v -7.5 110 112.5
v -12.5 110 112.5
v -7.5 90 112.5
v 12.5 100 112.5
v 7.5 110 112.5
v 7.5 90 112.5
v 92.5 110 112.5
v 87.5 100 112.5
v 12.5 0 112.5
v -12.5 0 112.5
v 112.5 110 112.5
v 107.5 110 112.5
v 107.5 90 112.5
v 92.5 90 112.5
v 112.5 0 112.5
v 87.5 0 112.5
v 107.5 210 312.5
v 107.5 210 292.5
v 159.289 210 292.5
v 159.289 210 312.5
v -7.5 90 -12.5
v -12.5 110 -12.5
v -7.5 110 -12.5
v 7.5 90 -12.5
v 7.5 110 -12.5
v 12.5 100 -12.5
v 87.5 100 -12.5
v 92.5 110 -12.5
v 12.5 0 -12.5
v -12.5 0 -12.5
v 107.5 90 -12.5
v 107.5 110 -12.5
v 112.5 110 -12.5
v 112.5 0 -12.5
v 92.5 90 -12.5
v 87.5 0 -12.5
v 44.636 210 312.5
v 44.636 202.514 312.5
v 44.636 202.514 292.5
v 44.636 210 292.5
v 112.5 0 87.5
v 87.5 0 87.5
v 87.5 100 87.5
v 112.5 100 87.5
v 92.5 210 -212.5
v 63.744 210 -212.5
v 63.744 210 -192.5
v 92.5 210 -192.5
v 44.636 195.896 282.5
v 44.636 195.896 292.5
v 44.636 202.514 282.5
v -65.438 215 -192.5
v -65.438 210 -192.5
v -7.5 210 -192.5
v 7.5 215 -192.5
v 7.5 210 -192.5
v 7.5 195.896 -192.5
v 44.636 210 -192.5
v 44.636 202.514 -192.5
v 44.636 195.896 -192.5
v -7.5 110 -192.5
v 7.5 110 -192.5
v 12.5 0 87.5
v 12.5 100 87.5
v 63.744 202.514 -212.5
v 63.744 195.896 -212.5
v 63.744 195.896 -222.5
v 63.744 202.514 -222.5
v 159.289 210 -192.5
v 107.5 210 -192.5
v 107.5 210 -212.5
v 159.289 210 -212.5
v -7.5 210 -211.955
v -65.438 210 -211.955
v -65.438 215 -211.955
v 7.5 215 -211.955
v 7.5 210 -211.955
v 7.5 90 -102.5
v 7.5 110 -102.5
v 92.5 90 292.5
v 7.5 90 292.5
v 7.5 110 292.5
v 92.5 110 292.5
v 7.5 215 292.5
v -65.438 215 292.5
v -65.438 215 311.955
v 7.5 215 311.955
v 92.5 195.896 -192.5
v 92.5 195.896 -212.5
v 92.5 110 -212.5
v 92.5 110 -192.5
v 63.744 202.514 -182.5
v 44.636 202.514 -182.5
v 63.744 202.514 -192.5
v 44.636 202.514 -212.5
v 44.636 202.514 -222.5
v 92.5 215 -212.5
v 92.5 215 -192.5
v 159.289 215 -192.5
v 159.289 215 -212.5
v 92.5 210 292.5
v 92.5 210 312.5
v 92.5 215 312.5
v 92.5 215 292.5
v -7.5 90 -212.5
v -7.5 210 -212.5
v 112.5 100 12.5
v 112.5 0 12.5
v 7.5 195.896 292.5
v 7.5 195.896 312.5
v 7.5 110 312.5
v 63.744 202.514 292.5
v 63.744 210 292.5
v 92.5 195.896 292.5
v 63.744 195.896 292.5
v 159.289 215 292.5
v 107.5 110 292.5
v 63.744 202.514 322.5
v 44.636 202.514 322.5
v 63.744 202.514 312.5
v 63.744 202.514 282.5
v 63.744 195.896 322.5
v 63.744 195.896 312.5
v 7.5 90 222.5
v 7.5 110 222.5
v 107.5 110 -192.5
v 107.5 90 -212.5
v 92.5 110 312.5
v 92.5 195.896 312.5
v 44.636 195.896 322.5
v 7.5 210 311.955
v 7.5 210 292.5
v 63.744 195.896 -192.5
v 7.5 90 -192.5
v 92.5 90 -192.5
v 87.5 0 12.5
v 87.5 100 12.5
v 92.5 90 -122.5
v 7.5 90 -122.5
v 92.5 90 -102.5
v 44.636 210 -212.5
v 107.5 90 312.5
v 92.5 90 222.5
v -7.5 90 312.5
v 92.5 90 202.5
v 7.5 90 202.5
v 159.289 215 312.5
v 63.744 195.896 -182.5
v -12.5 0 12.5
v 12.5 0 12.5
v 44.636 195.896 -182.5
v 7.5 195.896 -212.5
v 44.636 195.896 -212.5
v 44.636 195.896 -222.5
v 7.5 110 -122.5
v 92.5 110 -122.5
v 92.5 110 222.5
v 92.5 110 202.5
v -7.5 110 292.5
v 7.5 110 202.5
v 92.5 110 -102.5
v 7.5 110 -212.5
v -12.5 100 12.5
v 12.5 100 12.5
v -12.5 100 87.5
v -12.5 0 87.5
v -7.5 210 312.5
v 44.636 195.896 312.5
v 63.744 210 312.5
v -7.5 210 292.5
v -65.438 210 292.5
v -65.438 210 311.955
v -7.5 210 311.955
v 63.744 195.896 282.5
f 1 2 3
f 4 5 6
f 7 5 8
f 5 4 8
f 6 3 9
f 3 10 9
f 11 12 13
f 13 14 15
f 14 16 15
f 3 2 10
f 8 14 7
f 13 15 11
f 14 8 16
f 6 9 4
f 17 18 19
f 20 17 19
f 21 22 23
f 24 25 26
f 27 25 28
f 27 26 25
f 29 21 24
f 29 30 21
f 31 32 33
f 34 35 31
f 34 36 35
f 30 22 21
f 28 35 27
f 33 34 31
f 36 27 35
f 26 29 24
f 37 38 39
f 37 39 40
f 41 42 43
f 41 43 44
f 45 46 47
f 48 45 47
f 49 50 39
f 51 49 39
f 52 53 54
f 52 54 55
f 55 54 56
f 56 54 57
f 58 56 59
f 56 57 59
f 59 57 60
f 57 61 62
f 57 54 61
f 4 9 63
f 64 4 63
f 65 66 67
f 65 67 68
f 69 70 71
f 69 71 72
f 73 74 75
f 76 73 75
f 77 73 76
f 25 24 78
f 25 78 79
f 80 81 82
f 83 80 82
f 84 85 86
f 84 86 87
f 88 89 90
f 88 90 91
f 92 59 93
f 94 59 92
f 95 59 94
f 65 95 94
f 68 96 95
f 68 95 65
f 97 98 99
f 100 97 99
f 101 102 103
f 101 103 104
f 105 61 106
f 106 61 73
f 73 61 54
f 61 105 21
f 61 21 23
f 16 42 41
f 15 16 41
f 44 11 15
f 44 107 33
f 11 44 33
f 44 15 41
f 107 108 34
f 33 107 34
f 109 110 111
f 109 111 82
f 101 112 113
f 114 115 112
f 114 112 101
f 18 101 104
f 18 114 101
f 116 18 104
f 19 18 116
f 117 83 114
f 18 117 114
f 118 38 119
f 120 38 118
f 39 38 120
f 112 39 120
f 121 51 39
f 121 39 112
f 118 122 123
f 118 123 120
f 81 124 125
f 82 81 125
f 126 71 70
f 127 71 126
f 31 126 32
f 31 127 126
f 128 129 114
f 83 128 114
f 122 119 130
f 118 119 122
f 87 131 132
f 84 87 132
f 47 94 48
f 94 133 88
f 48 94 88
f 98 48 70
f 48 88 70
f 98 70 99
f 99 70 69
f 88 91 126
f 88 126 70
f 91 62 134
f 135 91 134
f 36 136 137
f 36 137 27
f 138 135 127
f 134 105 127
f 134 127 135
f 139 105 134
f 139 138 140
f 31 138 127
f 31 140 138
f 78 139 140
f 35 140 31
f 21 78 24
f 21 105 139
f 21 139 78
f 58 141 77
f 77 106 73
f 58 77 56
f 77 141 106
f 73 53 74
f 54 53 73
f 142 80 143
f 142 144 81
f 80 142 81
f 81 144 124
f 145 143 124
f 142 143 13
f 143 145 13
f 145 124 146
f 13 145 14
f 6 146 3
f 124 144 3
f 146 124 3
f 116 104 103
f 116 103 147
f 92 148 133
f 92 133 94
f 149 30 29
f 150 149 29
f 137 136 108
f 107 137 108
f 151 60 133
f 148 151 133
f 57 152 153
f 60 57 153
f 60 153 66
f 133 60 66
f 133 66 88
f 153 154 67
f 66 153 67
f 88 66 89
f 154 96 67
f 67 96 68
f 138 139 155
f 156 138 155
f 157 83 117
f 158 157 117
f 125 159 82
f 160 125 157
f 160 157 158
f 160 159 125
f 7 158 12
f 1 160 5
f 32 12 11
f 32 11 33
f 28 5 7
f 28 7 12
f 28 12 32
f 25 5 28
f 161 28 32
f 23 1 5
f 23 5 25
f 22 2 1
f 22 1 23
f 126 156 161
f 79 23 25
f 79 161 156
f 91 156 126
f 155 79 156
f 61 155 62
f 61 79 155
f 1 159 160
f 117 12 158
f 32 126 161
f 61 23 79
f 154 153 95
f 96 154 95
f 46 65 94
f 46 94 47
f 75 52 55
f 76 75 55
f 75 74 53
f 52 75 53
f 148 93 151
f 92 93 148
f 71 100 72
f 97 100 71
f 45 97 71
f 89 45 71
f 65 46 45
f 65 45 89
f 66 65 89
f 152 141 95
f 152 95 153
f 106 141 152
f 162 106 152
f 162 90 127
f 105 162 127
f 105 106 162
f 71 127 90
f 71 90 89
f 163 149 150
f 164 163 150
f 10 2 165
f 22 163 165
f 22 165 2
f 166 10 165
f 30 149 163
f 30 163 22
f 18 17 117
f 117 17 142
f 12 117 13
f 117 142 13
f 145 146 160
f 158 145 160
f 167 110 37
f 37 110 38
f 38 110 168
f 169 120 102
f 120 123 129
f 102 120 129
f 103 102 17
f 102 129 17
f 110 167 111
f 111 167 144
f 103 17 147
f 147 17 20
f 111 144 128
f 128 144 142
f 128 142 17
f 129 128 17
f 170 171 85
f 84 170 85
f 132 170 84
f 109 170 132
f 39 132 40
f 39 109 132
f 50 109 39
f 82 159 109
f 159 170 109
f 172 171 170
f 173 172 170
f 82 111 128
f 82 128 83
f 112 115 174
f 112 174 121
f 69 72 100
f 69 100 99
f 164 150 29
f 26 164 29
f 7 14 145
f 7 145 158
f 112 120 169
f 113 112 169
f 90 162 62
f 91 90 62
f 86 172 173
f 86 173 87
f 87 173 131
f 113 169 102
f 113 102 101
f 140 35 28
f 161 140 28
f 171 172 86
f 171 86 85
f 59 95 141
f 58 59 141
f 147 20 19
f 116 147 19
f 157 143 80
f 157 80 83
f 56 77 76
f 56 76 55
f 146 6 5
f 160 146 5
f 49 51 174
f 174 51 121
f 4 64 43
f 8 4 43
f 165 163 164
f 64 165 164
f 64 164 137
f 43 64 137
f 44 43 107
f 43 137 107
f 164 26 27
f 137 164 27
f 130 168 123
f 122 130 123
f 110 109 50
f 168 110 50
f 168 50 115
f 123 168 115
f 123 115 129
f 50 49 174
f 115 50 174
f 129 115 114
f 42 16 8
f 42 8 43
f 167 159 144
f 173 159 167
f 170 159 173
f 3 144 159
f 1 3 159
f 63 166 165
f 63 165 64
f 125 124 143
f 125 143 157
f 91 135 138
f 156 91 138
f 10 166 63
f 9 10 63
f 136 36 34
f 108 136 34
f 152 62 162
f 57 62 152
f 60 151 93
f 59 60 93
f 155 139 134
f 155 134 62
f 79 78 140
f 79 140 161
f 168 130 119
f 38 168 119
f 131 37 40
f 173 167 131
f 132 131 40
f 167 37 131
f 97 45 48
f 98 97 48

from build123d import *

# Parameters (mm, degrees)
SKETCH_1_W               = 25
SKETCH_1_H               = 25
EXTRUDE_1_DEPTH          = 100
PATTERN_LINEAR_1_COUNT   = 2
PATTERN_LINEAR_1_PITCH   = 100
PATTERN_LINEAR_1_2_COUNT = 2
PATTERN_LINEAR_1_2_PITCH = 100
SKETCH_2_W               = 125
SKETCH_2_H               = 125
EXTRUDE_2_DEPTH          = 10
SKETCH_3_W               = 15
SKETCH_3_H               = 20
EXTRUDE_3_DEPTH          = 200
EXTRUDE_4_REACH          = 349.536
SKETCH_4_W               = 20
SKETCH_4_H               = 20
PATTERN_LINEAR_2_COUNT   = 2
PATTERN_LINEAR_2_PITCH   = 90
SKETCH_5_W               = 15
SKETCH_5_H               = 20
EXTRUDE_5_DEPTH          = 100
EXTRUDE_6_REACH          = 392.872
SKETCH_6_W               = 20
SKETCH_6_H               = 14.103809958
CUT_EXTRUDE_1_REACH      = 389.016
SKETCH_7_W               = 19.107608913
SKETCH_7_H               = 7.486425105
SKETCH_8_W               = 72.938493455
SKETCH_8_H               = 19.454848412
EXTRUDE_7_DEPTH          = 5
SKETCH_9_W               = 66.78878025
SKETCH_9_H               = 20
EXTRUDE_8_DEPTH          = 5
MIRROR_1_COPY_1_REACH    = 349.536
MIRROR_1_COPY_1_SKETCH_W = 20
MIRROR_1_COPY_1_SKETCH_H = 20
EXTRUDE_9_DEPTH          = 10
EXTRUDE_9_DEPTH_BACK     = 30
SKETCH_10_W              = 19.107608913
SKETCH_10_H              = 6.617384853
EXTRUDE_10_DEPTH         = 10
EXTRUDE_10_DEPTH_BACK    = 30
SKETCH_11_W              = 19.107608913
SKETCH_11_H              = 6.617384853


with BuildPart() as part:
    # 草图1 → 凸台-拉伸1 (new body)
    with BuildSketch(Plane(origin=(0, 0, 0), x_dir=(1, 0, 0), z_dir=(0, 1, 0))):
        Rectangle(SKETCH_1_W, SKETCH_1_H)
    extrude(amount=EXTRUDE_1_DEPTH)


with BuildPart() as pattern_linear_1_1:
    # 阵列(线性)1: pattern copy
    add(part.part.moved(Location(Vector(0, 0, 1) * (1 * PATTERN_LINEAR_1_PITCH))))


with BuildPart() as pattern_linear_1_2_1:
    # Pattern Linear 1 2: pattern copy
    add(part.part.moved(Location(Vector(1, 0, 0) * (1 * PATTERN_LINEAR_1_2_PITCH))))


with BuildPart() as pattern_linear_1_2_2:
    # Pattern Linear 1 2: pattern copy
    add(pattern_linear_1_1.part.moved(Location(Vector(1, 0, 0) * (1 * PATTERN_LINEAR_1_2_PITCH))))


with BuildPart() as part_1:
    add(part.part)

    add(pattern_linear_1_1.part)  # 凸台-拉伸2 merges 阵列(线性)1_1

    add(pattern_linear_1_2_1.part)  # 凸台-拉伸2 merges 阵列(线性)1 2_1

    add(pattern_linear_1_2_2.part)  # 凸台-拉伸2 merges 阵列(线性)1 2_2
    # 草图2 → 凸台-拉伸2 (add)
    with BuildSketch(Plane(origin=(0, 100, 0), x_dir=(1, 0, 0), z_dir=(0, 1, 0))):
        with Locations((50, -50)):
            Rectangle(SKETCH_2_W, SKETCH_2_H)
    extrude(amount=EXTRUDE_2_DEPTH)

    # 草图3 → 凸台-拉伸3 (add)
    with BuildSketch(Plane.XY.offset(112.5)):
        with Locations((0, 100)):
            Rectangle(SKETCH_3_W, SKETCH_3_H)
        with Locations((100, 100)):
            Rectangle(SKETCH_3_W, SKETCH_3_H)
    extrude_3 = extrude(amount=EXTRUDE_3_DEPTH)

    # 草图4 → 凸台-拉伸4 (add, up to next)
    with BuildSketch(Plane(origin=(7.5, 0, 0), x_dir=(0, 0, -1), z_dir=(1, 0, 0)), mode=Mode.PRIVATE) as extrude_4_sk1:
        with Locations((-212.5, 100)):
            Rectangle(SKETCH_4_W, SKETCH_4_H)
    extrude_4_tool1 = extrude(extrude_4_sk1.sketch, amount=EXTRUDE_4_REACH, mode=Mode.PRIVATE) - part_1.part
    extrude_4 = extrude_4_tool1.solids().sort_by_distance((7.5, 100, 212.5))[0]
    add(extrude_4)

    # 阵列(线性)2: 凸台-拉伸4 ×2
    with Locations(*[(0, 0, i * PATTERN_LINEAR_2_PITCH) for i in range(1, PATTERN_LINEAR_2_COUNT)]):
        add(extrude_4)

    # 草图5 → 凸台-拉伸5 (add)
    with BuildSketch(Plane(origin=(0, 110, 0), x_dir=(1, 0, 0), z_dir=(0, 1, 0))):
        with Locations((100, -302.5)):
            Rectangle(SKETCH_5_W, SKETCH_5_H)
        with Locations((0, -302.5)):
            Rectangle(SKETCH_5_W, SKETCH_5_H)
    extrude_5 = extrude(amount=EXTRUDE_5_DEPTH)

    # 草图6 → 凸台-拉伸6 (add, up to next)
    with BuildSketch(Plane(origin=(7.5, 0, 0), x_dir=(0, 0, -1), z_dir=(1, 0, 0)), mode=Mode.PRIVATE) as extrude_6_sk1:
        with Locations((-302.5, 202.948095021)):
            Rectangle(SKETCH_6_W, SKETCH_6_H)
    extrude_6_tool1 = extrude(extrude_6_sk1.sketch, amount=EXTRUDE_6_REACH, mode=Mode.PRIVATE) - part_1.part
    extrude_6 = extrude_6_tool1.solids().sort_by_distance((7.5, 202.948095, 302.5))[0]
    add(extrude_6)

    # 草图7 → 切除-拉伸1 (cut, up to next)
    with BuildSketch(Plane(origin=(0, 0, 292.5), x_dir=(-1, 0, 0), z_dir=(0, 0, -1)), mode=Mode.PRIVATE) as cut_extrude_1_sk1:
        with Locations((-54.190265113, 206.256787448)):
            Rectangle(SKETCH_7_W, SKETCH_7_H)
    cut_extrude_1_tool1 = extrude(cut_extrude_1_sk1.sketch, amount=-CUT_EXTRUDE_1_REACH, mode=Mode.PRIVATE) & part_1.part
    cut_extrude_1 = cut_extrude_1_tool1.solids().sort_by_distance((54.190265, 206.256787, 292.5))[0]
    add(cut_extrude_1, mode=Mode.SUBTRACT)

    # 草图8 → 凸台-拉伸7 (add)
    with BuildSketch(Plane(origin=(0, 210, 0), x_dir=(1, 0, 0), z_dir=(0, 1, 0))):
        with Locations((-28.969246727, -302.227424206)):
            Rectangle(SKETCH_8_W, SKETCH_8_H)
    extrude_7 = extrude(amount=EXTRUDE_7_DEPTH)

    # 草图9 → 凸台-拉伸8 (add)
    with BuildSketch(Plane(origin=(0, 210, 0), x_dir=(1, 0, 0), z_dir=(0, 1, 0))):
        with Locations((125.894390125, -302.5)):
            Rectangle(SKETCH_9_W, SKETCH_9_H)
    extrude_8 = extrude(amount=EXTRUDE_8_DEPTH)

    # 镜向1: 凸台-拉伸3, 凸台-拉伸4, 凸台-拉伸5, 凸台-拉伸6, 切除-拉伸1, 凸台-拉伸7, 凸台-拉伸8 across plane
    add(extrude_3.mirror(Plane.XY.offset(50)))
    add(extrude_4.mirror(Plane.XY.offset(50)))
    add(extrude_5.mirror(Plane.XY.offset(50)))
    add(extrude_6.mirror(Plane.XY.offset(50)))
    add(cut_extrude_1.mirror(Plane.XY.offset(50)), mode=Mode.SUBTRACT)
    add(extrude_7.mirror(Plane.XY.offset(50)))
    add(extrude_8.mirror(Plane.XY.offset(50)))

    # 镜向1 copy 1 sketch → 镜向1 copy 1 (add, up to next)
    with BuildSketch(Plane(origin=(7.5, 0, 10), x_dir=(0, 0, 1), z_dir=(1, 0, 0)), mode=Mode.PRIVATE) as mirror_1_copy_1_sk1:
        with Locations((-212.5, -100)):
            Rectangle(MIRROR_1_COPY_1_SKETCH_W, MIRROR_1_COPY_1_SKETCH_H)
    mirror_1_copy_1_tool1 = extrude(mirror_1_copy_1_sk1.sketch, amount=MIRROR_1_COPY_1_REACH, mode=Mode.PRIVATE) - part_1.part
    add(mirror_1_copy_1_tool1.solids().sort_by_distance((7.5, 100, -202.5))[0])

    # 草图10 → 凸台-拉伸9 (add, two sides: drawn at the far end of the back side and taken through both)
    with BuildSketch(Plane.XY.offset(312.5).offset(-EXTRUDE_9_DEPTH_BACK)):
        with Locations((54.190265113, 199.204882468)):
            Rectangle(SKETCH_10_W, SKETCH_10_H)
    extrude(amount=EXTRUDE_9_DEPTH + EXTRUDE_9_DEPTH_BACK)

    # 草图11 → 凸台-拉伸10 (add, two sides: drawn at the far end of the back side and taken through both)
    with BuildSketch(Plane.XY.offset(-192.5).offset(-EXTRUDE_10_DEPTH_BACK)):
        with Locations((54.190265113, 199.204882468)):
            Rectangle(SKETCH_11_W, SKETCH_11_H)
    extrude(amount=EXTRUDE_10_DEPTH + EXTRUDE_10_DEPTH_BACK)


solid = part_1.part
